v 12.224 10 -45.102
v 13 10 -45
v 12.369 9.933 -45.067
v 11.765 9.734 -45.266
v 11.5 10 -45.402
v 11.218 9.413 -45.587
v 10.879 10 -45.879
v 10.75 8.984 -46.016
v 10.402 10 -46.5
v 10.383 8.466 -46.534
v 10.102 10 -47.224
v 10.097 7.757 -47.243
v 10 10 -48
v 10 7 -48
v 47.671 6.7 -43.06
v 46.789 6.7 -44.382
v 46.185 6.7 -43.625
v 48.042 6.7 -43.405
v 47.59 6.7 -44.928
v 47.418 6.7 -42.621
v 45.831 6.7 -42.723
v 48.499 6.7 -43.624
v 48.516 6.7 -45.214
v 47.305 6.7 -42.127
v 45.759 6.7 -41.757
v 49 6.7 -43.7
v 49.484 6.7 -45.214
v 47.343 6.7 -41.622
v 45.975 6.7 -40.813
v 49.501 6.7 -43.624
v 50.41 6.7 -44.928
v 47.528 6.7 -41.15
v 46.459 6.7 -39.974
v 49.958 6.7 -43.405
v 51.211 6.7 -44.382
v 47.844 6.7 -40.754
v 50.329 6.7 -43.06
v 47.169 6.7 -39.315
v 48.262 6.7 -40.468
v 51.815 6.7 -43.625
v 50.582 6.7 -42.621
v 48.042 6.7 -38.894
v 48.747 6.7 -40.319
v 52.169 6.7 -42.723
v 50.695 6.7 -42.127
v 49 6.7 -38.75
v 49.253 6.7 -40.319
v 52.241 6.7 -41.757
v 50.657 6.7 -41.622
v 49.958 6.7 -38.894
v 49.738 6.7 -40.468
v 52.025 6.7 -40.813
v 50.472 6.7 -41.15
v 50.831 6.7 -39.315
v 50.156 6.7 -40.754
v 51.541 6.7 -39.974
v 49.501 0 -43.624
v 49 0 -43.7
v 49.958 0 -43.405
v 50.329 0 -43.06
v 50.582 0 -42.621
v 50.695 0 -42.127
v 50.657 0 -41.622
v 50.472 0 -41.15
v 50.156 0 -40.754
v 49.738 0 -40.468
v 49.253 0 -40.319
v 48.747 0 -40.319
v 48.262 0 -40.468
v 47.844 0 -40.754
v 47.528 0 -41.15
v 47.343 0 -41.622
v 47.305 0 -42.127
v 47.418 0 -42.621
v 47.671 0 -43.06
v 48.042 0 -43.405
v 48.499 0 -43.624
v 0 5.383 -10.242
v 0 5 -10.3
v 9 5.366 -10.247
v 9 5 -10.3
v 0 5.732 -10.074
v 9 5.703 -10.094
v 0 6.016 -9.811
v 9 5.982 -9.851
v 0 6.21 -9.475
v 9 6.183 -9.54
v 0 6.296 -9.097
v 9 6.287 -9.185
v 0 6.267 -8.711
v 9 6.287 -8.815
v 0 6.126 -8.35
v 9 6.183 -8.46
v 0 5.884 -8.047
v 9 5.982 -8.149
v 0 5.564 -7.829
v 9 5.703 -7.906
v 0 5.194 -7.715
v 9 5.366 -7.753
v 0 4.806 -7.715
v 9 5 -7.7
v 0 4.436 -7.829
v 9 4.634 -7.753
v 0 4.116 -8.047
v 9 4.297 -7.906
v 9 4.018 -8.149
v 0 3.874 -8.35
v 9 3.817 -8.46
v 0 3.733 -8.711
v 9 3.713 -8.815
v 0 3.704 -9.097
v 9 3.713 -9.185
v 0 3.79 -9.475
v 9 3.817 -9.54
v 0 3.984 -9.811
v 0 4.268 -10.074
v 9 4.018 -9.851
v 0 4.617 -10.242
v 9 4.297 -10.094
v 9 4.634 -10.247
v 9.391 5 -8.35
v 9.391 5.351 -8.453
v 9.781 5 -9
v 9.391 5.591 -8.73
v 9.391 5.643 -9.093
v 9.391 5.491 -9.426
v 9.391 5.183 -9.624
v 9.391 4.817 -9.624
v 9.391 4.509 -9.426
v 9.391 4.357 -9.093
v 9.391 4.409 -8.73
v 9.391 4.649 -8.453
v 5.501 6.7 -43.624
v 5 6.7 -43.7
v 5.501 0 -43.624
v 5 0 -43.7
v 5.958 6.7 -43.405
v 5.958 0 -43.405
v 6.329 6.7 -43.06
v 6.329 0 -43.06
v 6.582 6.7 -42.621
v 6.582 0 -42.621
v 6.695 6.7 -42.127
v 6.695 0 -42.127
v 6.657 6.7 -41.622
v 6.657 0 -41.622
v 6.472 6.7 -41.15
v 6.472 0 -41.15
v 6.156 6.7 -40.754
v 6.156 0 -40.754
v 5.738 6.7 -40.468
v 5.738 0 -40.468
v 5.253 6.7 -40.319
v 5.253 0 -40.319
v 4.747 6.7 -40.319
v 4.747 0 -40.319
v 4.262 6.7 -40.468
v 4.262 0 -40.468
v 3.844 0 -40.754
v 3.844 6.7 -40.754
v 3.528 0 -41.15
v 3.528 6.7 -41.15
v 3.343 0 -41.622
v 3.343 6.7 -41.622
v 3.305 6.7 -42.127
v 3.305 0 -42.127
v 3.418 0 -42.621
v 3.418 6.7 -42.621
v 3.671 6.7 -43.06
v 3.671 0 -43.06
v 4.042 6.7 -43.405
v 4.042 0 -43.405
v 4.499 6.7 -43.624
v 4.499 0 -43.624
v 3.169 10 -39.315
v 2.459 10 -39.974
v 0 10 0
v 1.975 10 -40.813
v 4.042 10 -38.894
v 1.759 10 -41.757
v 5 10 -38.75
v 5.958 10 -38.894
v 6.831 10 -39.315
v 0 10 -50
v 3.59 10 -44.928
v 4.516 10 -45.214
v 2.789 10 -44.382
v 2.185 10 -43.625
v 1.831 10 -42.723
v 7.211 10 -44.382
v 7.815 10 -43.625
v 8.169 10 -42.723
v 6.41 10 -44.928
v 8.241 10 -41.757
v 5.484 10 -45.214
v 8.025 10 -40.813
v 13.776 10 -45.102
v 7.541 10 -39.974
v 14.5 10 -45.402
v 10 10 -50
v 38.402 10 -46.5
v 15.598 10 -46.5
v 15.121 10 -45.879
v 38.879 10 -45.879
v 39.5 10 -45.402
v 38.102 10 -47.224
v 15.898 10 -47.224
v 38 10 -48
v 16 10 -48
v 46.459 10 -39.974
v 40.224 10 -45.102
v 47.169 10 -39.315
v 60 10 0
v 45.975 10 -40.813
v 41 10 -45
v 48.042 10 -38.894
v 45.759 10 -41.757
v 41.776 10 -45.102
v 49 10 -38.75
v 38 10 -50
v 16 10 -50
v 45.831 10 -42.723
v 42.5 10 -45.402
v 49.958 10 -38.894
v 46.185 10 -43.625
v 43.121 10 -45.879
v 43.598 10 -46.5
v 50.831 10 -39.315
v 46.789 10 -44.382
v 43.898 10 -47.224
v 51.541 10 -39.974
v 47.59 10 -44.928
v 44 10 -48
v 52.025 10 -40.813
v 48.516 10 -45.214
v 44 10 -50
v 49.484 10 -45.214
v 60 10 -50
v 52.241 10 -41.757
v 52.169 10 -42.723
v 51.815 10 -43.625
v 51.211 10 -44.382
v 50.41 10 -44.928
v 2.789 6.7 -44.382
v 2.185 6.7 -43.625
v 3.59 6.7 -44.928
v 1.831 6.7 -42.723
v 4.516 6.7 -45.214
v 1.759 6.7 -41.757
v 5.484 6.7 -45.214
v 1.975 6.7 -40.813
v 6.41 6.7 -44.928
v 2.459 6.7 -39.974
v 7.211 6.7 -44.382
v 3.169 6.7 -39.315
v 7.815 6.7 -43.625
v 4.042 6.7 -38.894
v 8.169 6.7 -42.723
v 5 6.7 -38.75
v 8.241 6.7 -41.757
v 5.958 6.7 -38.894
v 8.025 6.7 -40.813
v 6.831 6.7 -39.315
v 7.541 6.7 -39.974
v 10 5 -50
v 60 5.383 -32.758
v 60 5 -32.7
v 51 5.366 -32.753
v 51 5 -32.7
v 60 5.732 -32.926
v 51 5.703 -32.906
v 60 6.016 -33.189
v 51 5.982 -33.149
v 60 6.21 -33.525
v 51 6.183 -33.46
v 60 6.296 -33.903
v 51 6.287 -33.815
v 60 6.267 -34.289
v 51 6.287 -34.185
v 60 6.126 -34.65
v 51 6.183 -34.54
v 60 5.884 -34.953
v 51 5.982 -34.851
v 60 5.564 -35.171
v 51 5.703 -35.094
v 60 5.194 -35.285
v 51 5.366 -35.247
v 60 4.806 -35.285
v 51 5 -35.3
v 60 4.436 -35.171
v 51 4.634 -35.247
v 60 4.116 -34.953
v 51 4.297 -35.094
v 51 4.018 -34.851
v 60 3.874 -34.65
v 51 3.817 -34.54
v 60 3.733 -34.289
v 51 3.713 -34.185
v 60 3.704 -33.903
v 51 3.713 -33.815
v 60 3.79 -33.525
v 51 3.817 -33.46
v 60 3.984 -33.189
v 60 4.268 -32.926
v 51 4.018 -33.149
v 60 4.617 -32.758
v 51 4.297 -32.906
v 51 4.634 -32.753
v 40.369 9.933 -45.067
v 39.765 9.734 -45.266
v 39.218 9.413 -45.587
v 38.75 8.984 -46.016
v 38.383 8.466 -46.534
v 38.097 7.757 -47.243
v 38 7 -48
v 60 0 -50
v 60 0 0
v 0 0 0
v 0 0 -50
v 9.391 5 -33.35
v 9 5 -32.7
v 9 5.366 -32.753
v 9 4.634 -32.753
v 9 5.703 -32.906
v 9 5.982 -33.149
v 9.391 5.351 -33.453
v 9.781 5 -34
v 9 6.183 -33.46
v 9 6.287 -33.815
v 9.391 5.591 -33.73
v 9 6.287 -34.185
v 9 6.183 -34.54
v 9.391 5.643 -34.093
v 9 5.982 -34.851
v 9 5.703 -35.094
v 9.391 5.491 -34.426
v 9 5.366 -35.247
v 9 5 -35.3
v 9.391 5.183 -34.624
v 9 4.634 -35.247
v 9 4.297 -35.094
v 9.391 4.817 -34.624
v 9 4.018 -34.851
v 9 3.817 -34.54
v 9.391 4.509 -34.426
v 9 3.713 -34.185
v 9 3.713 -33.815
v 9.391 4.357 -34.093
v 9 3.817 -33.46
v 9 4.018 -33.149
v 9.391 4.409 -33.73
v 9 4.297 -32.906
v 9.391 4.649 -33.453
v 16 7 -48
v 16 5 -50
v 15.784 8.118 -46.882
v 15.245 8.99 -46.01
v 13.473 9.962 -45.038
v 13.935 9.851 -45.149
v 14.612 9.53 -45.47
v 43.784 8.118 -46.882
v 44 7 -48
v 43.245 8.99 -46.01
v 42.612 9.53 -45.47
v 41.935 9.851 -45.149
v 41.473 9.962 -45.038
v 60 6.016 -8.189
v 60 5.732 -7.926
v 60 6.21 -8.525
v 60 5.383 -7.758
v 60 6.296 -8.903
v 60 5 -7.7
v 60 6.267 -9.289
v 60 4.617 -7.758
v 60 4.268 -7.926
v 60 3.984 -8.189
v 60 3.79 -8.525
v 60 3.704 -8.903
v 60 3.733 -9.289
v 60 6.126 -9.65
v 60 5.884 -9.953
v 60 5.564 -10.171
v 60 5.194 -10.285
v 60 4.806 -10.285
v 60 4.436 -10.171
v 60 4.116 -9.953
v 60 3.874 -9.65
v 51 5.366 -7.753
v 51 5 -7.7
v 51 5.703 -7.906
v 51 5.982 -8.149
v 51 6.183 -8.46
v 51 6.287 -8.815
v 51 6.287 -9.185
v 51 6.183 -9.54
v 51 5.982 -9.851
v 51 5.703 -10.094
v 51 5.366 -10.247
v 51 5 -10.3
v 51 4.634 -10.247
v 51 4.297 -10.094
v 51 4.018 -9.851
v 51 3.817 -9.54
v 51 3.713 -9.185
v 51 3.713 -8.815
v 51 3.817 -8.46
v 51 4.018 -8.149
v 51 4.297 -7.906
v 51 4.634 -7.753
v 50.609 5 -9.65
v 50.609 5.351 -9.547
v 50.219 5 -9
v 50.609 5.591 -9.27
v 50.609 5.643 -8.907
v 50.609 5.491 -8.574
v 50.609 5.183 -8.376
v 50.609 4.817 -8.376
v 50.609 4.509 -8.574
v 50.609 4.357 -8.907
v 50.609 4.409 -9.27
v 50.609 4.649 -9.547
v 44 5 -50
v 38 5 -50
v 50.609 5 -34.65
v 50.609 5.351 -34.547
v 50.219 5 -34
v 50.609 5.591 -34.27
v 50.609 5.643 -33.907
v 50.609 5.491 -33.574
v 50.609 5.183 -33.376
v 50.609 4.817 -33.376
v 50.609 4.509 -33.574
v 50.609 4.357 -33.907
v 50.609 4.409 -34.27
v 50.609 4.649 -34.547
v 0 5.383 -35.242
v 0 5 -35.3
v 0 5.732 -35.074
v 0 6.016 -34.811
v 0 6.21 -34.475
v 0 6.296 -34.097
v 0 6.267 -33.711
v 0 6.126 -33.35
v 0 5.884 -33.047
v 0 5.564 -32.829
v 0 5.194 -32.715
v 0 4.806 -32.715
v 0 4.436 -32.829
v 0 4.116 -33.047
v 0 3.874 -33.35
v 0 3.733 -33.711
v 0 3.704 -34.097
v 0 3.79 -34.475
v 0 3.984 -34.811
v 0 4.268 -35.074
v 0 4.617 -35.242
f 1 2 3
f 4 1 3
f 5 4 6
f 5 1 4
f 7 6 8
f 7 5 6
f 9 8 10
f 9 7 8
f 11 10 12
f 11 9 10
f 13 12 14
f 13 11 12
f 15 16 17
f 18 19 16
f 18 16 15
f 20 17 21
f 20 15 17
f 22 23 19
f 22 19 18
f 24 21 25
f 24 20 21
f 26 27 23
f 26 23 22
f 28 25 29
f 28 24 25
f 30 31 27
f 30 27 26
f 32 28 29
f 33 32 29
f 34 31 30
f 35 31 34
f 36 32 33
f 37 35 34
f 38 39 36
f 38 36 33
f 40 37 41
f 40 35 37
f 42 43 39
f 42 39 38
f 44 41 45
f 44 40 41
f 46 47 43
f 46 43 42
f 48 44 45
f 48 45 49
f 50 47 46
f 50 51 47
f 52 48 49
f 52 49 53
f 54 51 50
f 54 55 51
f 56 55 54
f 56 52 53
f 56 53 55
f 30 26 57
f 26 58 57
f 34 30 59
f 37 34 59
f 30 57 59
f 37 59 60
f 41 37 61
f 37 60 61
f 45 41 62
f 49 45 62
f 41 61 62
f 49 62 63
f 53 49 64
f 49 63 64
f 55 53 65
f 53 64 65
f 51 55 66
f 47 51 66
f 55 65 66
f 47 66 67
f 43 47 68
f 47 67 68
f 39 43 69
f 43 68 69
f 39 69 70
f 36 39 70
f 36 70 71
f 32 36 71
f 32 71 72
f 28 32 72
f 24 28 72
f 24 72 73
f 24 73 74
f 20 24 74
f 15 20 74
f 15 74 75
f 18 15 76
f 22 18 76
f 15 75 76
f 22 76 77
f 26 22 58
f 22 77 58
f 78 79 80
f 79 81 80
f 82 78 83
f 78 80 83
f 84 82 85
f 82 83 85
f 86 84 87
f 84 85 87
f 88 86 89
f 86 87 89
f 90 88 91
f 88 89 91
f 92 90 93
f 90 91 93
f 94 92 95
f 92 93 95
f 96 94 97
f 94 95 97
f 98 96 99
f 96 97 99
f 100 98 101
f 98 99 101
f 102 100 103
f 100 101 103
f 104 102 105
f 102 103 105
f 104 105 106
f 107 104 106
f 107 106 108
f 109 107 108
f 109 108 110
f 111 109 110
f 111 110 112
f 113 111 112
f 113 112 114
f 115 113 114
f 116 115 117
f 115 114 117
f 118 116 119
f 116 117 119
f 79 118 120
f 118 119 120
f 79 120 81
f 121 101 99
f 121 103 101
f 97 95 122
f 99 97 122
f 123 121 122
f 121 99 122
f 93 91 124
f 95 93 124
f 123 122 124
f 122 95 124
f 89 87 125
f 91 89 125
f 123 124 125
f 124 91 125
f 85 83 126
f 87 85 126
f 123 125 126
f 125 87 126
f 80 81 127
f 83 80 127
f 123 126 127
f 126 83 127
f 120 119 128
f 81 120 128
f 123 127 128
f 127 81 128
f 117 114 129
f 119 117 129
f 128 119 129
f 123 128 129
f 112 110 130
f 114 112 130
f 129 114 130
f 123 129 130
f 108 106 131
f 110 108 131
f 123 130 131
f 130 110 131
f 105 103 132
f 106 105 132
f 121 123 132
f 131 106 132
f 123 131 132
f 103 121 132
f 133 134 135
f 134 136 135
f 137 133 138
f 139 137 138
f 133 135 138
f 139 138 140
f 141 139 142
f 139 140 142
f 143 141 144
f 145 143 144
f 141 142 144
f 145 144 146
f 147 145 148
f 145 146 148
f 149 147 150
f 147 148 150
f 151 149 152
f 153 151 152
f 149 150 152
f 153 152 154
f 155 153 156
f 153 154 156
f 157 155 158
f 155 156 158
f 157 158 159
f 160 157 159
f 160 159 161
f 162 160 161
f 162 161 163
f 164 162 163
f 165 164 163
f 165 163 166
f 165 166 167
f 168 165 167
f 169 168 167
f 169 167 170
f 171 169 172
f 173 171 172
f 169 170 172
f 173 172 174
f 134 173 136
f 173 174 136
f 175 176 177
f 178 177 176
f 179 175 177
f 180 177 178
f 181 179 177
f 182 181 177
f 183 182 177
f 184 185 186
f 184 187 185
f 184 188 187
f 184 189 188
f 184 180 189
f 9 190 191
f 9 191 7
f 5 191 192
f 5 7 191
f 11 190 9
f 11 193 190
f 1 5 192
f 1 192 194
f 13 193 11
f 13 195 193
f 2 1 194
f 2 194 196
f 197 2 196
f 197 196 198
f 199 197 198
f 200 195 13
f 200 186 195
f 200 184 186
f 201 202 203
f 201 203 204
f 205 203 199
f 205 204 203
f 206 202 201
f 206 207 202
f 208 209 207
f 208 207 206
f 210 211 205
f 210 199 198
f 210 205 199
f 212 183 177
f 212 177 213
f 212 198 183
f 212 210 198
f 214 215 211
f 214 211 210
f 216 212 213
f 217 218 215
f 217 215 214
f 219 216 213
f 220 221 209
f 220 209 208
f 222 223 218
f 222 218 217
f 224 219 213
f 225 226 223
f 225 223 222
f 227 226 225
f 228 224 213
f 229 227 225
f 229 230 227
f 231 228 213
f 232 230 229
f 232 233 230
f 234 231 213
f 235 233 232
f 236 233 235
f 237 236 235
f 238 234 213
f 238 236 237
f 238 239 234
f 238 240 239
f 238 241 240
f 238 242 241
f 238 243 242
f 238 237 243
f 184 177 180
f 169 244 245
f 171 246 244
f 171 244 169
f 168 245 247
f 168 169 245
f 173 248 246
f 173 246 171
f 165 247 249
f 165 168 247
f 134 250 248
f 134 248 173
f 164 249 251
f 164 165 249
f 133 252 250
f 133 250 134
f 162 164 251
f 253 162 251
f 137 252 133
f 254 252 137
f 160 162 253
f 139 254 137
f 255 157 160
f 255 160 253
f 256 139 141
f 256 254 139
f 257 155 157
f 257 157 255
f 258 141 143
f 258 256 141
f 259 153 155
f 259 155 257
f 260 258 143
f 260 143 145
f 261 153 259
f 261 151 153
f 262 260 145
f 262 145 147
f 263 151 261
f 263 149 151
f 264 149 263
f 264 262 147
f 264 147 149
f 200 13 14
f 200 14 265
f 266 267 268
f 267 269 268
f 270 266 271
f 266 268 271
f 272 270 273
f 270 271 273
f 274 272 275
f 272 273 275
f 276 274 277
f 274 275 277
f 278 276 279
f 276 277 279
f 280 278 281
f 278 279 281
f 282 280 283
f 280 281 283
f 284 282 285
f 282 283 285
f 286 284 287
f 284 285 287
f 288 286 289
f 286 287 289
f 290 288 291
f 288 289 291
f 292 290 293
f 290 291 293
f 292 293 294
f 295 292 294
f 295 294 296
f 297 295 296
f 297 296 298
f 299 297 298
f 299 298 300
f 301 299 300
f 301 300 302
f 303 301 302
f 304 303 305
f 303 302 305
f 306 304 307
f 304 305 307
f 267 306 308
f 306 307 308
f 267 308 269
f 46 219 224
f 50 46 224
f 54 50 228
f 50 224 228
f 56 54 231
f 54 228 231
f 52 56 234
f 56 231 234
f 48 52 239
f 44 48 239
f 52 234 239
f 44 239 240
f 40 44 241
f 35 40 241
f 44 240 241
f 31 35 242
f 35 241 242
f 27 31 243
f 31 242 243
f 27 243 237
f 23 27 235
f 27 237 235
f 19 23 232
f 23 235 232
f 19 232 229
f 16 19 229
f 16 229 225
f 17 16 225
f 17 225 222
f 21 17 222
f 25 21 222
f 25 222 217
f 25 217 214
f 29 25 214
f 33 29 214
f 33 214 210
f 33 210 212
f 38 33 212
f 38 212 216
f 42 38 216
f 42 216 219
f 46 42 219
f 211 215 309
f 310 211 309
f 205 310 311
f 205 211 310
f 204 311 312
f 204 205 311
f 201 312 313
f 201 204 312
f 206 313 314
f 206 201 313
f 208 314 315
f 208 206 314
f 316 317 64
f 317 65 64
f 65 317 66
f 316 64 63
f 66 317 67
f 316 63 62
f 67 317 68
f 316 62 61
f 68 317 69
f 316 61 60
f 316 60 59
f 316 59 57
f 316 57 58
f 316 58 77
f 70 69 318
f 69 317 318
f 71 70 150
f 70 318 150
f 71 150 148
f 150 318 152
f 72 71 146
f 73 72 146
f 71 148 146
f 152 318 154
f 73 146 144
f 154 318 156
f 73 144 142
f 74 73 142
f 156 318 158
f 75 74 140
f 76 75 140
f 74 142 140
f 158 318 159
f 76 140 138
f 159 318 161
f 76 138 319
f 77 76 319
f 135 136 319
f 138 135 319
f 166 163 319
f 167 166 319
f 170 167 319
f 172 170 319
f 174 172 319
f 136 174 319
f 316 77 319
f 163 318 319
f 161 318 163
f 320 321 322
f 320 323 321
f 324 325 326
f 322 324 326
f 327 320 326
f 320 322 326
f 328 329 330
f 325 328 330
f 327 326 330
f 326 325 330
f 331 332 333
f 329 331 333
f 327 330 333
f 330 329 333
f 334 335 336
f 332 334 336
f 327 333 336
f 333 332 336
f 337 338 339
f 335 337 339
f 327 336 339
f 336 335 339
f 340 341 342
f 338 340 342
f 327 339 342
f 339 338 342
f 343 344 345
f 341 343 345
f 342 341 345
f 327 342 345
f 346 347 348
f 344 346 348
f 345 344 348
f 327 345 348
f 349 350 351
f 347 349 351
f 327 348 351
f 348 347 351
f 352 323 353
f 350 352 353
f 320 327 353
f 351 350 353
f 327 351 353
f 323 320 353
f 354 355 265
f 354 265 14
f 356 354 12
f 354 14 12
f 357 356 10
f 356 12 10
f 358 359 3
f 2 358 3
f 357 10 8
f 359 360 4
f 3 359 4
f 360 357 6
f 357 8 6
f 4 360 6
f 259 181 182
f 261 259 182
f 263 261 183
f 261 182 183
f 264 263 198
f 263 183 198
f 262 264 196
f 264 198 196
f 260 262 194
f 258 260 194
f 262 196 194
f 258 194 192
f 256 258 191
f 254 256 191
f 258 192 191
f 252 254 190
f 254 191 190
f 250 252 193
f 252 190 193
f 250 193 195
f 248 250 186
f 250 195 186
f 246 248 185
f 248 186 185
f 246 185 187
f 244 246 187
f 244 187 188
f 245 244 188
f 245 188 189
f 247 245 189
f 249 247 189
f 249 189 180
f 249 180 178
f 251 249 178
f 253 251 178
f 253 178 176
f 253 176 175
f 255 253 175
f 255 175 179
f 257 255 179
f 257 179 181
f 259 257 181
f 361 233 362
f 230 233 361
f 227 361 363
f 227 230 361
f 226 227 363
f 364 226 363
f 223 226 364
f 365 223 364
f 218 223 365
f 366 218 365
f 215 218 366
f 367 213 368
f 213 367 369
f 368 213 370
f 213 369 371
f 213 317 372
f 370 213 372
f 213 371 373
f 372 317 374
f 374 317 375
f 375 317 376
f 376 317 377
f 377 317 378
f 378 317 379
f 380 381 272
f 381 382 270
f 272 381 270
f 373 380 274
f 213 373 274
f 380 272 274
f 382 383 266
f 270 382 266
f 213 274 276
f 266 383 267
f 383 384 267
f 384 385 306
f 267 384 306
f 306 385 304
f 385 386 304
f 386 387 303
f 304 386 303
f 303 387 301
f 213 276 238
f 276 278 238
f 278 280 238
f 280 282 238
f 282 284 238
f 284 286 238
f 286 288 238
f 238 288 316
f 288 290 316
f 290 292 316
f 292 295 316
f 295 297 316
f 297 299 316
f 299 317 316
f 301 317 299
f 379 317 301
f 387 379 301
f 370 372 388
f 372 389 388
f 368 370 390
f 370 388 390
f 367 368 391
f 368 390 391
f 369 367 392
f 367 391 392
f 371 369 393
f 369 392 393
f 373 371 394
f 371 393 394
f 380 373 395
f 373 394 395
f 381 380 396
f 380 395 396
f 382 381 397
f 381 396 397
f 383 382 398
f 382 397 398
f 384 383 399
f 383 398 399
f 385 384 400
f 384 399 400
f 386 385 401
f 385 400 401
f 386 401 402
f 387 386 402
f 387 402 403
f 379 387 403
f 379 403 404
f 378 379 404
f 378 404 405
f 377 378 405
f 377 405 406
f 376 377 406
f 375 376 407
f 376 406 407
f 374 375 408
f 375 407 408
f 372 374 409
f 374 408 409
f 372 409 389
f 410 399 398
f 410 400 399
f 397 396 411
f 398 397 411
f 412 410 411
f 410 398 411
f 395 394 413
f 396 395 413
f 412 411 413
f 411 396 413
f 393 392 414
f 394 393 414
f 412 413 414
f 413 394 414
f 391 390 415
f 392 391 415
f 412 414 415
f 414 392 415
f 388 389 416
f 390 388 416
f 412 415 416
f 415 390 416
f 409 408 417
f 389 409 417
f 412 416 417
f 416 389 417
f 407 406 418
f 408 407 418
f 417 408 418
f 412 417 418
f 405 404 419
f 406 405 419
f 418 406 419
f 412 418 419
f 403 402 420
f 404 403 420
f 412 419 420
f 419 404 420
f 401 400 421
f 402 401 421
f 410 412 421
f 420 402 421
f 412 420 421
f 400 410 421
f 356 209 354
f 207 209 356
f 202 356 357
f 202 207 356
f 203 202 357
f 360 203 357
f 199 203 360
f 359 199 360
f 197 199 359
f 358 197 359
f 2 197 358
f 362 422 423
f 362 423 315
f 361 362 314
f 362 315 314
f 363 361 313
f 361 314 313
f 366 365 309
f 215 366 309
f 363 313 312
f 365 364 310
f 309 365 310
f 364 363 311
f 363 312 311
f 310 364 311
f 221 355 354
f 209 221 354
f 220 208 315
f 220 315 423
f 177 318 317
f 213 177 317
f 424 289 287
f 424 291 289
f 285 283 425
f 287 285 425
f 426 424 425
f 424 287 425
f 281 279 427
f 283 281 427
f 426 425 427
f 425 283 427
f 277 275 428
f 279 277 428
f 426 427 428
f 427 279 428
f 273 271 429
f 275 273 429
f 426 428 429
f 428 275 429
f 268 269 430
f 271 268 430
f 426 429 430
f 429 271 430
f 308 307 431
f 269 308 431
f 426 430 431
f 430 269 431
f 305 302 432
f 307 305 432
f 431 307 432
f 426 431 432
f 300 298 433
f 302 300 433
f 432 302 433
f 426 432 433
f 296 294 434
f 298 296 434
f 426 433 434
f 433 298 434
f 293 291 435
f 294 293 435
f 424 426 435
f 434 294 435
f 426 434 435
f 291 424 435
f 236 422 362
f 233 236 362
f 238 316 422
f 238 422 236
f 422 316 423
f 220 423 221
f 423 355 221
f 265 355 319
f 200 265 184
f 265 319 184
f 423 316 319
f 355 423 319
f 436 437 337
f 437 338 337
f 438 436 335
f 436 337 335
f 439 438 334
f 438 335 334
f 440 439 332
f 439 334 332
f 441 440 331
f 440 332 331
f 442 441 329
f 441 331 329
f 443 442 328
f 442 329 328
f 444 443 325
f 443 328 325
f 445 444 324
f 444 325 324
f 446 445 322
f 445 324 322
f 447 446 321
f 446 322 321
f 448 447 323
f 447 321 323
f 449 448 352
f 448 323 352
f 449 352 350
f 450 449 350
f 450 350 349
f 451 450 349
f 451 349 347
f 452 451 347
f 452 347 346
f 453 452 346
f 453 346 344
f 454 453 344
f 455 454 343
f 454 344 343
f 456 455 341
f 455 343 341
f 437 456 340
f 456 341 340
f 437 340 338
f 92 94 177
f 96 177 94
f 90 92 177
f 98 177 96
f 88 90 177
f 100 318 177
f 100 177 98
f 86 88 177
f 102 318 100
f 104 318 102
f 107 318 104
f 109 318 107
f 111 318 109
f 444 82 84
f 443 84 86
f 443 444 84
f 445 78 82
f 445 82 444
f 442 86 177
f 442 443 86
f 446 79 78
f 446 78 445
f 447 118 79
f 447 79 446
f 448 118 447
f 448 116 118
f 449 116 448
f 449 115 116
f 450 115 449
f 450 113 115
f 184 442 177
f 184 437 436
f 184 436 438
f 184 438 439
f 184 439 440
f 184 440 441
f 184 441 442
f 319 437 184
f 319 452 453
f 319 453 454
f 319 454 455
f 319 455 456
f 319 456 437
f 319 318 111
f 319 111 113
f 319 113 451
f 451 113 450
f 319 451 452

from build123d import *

# Parameters (mm, degrees)
SKETCH1_W                                = 60
SKETCH1_H                                = 50
BOSS_EXTRUDE1_DEPTH                      = 10
CUT_EXTRUDE1_DEPTH                       = 10
BOSS_EXTRUDE2_REACH                      = 80.74
CBORE_FOR_M3_PAN_HEAD_SCREW1_D           = 3.4
CBORE_FOR_M3_PAN_HEAD_SCREW1_CBORE_D     = 6.5
CBORE_FOR_M3_PAN_HEAD_SCREW1_CBORE_DEPTH = 3.3
M3X0_5_TAPPED_HOLE1_D                    = 2.6
M3X0_5_TAPPED_HOLE1_DEPTH                = 9
M3X0_5_TAPPED_HOLE1_TIP                  = 0.781118805
M3X0_5_TAPPED_HOLE2_D                    = 2.6
M3X0_5_TAPPED_HOLE2_DEPTH                = 9
M3X0_5_TAPPED_HOLE2_TIP                  = 0.781118805


with BuildPart() as part:
    # Sketch1 → Boss-Extrude1 (new body)
    with BuildSketch(Plane(origin=(0, 0, 0), x_dir=(1, 0, 0), z_dir=(0, 1, 0))):
        with Locations((30, 25)):
            Rectangle(SKETCH1_W, SKETCH1_H)
    extrude(amount=BOSS_EXTRUDE1_DEPTH)

    # Sketch2 → Cut-Extrude1 (cut)
    with BuildSketch(Plane(origin=(0, 10, 0), x_dir=(1, 0, 0), z_dir=(0, 1, 0))):
        with BuildLine():
            Line((38, 48), (38, 50))
            Line((38, 50), (44, 50))
            Line((44, 50), (44, 48))
            ThreePointArc((44, 48), (41, 45), (38, 48))
        make_face()
        with BuildLine():
            Line((10, 48), (10, 50))
            Line((10, 50), (16, 50))
            Line((16, 50), (16, 48))
            ThreePointArc((16, 48), (13, 45), (10, 48))
        make_face()
    extrude(amount=-CUT_EXTRUDE1_DEPTH, mode=Mode.SUBTRACT)

    # Sketch3 → Boss-Extrude2 (add, up to next)
    with BuildSketch(Plane(origin=(0, 0, 0), x_dir=(0, 0, -1), z_dir=(1, 0, 0)), mode=Mode.PRIVATE) as boss_extrude2_sk1:
        Polygon((45, 0), (50, 0), (50, 5), (45, 10), align=None)
    boss_extrude2_tool1 = extrude(boss_extrude2_sk1.sketch, amount=BOSS_EXTRUDE2_REACH, mode=Mode.PRIVATE) - part.part
    add(boss_extrude2_tool1.solids().sort_by_distance((0, 3.888889, -47.222222))[0])
    add(boss_extrude2_tool1.solids().sort_by_distance((0, 3.888889, -47.222222))[1])

    # CBORE for M3 Pan Head Screw1 (through all)
    with Locations(Plane(origin=(5, 10, -42), x_dir=(0, 0, 1), z_dir=(0, 1, 0))):
        with Locations((0, 0), (0, 44)):
            CounterBoreHole(CBORE_FOR_M3_PAN_HEAD_SCREW1_D / 2, CBORE_FOR_M3_PAN_HEAD_SCREW1_CBORE_D / 2, CBORE_FOR_M3_PAN_HEAD_SCREW1_CBORE_DEPTH)

    # M3x0.5 Tapped Hole1
    with Locations(Plane(origin=(60, 0, 0), x_dir=(0, 0, -1), z_dir=(1, 0, 0))):
        with Locations((34, 5), (9, 5)):
            Hole(M3X0_5_TAPPED_HOLE1_D / 2, depth=M3X0_5_TAPPED_HOLE1_DEPTH)
            with Locations((0, 0, -(M3X0_5_TAPPED_HOLE1_DEPTH + M3X0_5_TAPPED_HOLE1_TIP / 2))):  # 118° drill point
                Cone(0, M3X0_5_TAPPED_HOLE1_D / 2, M3X0_5_TAPPED_HOLE1_TIP, mode=Mode.SUBTRACT)

    # M3x0.5 Tapped Hole2
    with Locations(Plane.ZY):
        with Locations((-34, 5), (-9, 5)):
            Hole(M3X0_5_TAPPED_HOLE2_D / 2, depth=M3X0_5_TAPPED_HOLE2_DEPTH)
            with Locations((0, 0, -(M3X0_5_TAPPED_HOLE2_DEPTH + M3X0_5_TAPPED_HOLE2_TIP / 2))):  # 118° drill point
                Cone(0, M3X0_5_TAPPED_HOLE2_D / 2, M3X0_5_TAPPED_HOLE2_TIP, mode=Mode.SUBTRACT)


solid = part.part
